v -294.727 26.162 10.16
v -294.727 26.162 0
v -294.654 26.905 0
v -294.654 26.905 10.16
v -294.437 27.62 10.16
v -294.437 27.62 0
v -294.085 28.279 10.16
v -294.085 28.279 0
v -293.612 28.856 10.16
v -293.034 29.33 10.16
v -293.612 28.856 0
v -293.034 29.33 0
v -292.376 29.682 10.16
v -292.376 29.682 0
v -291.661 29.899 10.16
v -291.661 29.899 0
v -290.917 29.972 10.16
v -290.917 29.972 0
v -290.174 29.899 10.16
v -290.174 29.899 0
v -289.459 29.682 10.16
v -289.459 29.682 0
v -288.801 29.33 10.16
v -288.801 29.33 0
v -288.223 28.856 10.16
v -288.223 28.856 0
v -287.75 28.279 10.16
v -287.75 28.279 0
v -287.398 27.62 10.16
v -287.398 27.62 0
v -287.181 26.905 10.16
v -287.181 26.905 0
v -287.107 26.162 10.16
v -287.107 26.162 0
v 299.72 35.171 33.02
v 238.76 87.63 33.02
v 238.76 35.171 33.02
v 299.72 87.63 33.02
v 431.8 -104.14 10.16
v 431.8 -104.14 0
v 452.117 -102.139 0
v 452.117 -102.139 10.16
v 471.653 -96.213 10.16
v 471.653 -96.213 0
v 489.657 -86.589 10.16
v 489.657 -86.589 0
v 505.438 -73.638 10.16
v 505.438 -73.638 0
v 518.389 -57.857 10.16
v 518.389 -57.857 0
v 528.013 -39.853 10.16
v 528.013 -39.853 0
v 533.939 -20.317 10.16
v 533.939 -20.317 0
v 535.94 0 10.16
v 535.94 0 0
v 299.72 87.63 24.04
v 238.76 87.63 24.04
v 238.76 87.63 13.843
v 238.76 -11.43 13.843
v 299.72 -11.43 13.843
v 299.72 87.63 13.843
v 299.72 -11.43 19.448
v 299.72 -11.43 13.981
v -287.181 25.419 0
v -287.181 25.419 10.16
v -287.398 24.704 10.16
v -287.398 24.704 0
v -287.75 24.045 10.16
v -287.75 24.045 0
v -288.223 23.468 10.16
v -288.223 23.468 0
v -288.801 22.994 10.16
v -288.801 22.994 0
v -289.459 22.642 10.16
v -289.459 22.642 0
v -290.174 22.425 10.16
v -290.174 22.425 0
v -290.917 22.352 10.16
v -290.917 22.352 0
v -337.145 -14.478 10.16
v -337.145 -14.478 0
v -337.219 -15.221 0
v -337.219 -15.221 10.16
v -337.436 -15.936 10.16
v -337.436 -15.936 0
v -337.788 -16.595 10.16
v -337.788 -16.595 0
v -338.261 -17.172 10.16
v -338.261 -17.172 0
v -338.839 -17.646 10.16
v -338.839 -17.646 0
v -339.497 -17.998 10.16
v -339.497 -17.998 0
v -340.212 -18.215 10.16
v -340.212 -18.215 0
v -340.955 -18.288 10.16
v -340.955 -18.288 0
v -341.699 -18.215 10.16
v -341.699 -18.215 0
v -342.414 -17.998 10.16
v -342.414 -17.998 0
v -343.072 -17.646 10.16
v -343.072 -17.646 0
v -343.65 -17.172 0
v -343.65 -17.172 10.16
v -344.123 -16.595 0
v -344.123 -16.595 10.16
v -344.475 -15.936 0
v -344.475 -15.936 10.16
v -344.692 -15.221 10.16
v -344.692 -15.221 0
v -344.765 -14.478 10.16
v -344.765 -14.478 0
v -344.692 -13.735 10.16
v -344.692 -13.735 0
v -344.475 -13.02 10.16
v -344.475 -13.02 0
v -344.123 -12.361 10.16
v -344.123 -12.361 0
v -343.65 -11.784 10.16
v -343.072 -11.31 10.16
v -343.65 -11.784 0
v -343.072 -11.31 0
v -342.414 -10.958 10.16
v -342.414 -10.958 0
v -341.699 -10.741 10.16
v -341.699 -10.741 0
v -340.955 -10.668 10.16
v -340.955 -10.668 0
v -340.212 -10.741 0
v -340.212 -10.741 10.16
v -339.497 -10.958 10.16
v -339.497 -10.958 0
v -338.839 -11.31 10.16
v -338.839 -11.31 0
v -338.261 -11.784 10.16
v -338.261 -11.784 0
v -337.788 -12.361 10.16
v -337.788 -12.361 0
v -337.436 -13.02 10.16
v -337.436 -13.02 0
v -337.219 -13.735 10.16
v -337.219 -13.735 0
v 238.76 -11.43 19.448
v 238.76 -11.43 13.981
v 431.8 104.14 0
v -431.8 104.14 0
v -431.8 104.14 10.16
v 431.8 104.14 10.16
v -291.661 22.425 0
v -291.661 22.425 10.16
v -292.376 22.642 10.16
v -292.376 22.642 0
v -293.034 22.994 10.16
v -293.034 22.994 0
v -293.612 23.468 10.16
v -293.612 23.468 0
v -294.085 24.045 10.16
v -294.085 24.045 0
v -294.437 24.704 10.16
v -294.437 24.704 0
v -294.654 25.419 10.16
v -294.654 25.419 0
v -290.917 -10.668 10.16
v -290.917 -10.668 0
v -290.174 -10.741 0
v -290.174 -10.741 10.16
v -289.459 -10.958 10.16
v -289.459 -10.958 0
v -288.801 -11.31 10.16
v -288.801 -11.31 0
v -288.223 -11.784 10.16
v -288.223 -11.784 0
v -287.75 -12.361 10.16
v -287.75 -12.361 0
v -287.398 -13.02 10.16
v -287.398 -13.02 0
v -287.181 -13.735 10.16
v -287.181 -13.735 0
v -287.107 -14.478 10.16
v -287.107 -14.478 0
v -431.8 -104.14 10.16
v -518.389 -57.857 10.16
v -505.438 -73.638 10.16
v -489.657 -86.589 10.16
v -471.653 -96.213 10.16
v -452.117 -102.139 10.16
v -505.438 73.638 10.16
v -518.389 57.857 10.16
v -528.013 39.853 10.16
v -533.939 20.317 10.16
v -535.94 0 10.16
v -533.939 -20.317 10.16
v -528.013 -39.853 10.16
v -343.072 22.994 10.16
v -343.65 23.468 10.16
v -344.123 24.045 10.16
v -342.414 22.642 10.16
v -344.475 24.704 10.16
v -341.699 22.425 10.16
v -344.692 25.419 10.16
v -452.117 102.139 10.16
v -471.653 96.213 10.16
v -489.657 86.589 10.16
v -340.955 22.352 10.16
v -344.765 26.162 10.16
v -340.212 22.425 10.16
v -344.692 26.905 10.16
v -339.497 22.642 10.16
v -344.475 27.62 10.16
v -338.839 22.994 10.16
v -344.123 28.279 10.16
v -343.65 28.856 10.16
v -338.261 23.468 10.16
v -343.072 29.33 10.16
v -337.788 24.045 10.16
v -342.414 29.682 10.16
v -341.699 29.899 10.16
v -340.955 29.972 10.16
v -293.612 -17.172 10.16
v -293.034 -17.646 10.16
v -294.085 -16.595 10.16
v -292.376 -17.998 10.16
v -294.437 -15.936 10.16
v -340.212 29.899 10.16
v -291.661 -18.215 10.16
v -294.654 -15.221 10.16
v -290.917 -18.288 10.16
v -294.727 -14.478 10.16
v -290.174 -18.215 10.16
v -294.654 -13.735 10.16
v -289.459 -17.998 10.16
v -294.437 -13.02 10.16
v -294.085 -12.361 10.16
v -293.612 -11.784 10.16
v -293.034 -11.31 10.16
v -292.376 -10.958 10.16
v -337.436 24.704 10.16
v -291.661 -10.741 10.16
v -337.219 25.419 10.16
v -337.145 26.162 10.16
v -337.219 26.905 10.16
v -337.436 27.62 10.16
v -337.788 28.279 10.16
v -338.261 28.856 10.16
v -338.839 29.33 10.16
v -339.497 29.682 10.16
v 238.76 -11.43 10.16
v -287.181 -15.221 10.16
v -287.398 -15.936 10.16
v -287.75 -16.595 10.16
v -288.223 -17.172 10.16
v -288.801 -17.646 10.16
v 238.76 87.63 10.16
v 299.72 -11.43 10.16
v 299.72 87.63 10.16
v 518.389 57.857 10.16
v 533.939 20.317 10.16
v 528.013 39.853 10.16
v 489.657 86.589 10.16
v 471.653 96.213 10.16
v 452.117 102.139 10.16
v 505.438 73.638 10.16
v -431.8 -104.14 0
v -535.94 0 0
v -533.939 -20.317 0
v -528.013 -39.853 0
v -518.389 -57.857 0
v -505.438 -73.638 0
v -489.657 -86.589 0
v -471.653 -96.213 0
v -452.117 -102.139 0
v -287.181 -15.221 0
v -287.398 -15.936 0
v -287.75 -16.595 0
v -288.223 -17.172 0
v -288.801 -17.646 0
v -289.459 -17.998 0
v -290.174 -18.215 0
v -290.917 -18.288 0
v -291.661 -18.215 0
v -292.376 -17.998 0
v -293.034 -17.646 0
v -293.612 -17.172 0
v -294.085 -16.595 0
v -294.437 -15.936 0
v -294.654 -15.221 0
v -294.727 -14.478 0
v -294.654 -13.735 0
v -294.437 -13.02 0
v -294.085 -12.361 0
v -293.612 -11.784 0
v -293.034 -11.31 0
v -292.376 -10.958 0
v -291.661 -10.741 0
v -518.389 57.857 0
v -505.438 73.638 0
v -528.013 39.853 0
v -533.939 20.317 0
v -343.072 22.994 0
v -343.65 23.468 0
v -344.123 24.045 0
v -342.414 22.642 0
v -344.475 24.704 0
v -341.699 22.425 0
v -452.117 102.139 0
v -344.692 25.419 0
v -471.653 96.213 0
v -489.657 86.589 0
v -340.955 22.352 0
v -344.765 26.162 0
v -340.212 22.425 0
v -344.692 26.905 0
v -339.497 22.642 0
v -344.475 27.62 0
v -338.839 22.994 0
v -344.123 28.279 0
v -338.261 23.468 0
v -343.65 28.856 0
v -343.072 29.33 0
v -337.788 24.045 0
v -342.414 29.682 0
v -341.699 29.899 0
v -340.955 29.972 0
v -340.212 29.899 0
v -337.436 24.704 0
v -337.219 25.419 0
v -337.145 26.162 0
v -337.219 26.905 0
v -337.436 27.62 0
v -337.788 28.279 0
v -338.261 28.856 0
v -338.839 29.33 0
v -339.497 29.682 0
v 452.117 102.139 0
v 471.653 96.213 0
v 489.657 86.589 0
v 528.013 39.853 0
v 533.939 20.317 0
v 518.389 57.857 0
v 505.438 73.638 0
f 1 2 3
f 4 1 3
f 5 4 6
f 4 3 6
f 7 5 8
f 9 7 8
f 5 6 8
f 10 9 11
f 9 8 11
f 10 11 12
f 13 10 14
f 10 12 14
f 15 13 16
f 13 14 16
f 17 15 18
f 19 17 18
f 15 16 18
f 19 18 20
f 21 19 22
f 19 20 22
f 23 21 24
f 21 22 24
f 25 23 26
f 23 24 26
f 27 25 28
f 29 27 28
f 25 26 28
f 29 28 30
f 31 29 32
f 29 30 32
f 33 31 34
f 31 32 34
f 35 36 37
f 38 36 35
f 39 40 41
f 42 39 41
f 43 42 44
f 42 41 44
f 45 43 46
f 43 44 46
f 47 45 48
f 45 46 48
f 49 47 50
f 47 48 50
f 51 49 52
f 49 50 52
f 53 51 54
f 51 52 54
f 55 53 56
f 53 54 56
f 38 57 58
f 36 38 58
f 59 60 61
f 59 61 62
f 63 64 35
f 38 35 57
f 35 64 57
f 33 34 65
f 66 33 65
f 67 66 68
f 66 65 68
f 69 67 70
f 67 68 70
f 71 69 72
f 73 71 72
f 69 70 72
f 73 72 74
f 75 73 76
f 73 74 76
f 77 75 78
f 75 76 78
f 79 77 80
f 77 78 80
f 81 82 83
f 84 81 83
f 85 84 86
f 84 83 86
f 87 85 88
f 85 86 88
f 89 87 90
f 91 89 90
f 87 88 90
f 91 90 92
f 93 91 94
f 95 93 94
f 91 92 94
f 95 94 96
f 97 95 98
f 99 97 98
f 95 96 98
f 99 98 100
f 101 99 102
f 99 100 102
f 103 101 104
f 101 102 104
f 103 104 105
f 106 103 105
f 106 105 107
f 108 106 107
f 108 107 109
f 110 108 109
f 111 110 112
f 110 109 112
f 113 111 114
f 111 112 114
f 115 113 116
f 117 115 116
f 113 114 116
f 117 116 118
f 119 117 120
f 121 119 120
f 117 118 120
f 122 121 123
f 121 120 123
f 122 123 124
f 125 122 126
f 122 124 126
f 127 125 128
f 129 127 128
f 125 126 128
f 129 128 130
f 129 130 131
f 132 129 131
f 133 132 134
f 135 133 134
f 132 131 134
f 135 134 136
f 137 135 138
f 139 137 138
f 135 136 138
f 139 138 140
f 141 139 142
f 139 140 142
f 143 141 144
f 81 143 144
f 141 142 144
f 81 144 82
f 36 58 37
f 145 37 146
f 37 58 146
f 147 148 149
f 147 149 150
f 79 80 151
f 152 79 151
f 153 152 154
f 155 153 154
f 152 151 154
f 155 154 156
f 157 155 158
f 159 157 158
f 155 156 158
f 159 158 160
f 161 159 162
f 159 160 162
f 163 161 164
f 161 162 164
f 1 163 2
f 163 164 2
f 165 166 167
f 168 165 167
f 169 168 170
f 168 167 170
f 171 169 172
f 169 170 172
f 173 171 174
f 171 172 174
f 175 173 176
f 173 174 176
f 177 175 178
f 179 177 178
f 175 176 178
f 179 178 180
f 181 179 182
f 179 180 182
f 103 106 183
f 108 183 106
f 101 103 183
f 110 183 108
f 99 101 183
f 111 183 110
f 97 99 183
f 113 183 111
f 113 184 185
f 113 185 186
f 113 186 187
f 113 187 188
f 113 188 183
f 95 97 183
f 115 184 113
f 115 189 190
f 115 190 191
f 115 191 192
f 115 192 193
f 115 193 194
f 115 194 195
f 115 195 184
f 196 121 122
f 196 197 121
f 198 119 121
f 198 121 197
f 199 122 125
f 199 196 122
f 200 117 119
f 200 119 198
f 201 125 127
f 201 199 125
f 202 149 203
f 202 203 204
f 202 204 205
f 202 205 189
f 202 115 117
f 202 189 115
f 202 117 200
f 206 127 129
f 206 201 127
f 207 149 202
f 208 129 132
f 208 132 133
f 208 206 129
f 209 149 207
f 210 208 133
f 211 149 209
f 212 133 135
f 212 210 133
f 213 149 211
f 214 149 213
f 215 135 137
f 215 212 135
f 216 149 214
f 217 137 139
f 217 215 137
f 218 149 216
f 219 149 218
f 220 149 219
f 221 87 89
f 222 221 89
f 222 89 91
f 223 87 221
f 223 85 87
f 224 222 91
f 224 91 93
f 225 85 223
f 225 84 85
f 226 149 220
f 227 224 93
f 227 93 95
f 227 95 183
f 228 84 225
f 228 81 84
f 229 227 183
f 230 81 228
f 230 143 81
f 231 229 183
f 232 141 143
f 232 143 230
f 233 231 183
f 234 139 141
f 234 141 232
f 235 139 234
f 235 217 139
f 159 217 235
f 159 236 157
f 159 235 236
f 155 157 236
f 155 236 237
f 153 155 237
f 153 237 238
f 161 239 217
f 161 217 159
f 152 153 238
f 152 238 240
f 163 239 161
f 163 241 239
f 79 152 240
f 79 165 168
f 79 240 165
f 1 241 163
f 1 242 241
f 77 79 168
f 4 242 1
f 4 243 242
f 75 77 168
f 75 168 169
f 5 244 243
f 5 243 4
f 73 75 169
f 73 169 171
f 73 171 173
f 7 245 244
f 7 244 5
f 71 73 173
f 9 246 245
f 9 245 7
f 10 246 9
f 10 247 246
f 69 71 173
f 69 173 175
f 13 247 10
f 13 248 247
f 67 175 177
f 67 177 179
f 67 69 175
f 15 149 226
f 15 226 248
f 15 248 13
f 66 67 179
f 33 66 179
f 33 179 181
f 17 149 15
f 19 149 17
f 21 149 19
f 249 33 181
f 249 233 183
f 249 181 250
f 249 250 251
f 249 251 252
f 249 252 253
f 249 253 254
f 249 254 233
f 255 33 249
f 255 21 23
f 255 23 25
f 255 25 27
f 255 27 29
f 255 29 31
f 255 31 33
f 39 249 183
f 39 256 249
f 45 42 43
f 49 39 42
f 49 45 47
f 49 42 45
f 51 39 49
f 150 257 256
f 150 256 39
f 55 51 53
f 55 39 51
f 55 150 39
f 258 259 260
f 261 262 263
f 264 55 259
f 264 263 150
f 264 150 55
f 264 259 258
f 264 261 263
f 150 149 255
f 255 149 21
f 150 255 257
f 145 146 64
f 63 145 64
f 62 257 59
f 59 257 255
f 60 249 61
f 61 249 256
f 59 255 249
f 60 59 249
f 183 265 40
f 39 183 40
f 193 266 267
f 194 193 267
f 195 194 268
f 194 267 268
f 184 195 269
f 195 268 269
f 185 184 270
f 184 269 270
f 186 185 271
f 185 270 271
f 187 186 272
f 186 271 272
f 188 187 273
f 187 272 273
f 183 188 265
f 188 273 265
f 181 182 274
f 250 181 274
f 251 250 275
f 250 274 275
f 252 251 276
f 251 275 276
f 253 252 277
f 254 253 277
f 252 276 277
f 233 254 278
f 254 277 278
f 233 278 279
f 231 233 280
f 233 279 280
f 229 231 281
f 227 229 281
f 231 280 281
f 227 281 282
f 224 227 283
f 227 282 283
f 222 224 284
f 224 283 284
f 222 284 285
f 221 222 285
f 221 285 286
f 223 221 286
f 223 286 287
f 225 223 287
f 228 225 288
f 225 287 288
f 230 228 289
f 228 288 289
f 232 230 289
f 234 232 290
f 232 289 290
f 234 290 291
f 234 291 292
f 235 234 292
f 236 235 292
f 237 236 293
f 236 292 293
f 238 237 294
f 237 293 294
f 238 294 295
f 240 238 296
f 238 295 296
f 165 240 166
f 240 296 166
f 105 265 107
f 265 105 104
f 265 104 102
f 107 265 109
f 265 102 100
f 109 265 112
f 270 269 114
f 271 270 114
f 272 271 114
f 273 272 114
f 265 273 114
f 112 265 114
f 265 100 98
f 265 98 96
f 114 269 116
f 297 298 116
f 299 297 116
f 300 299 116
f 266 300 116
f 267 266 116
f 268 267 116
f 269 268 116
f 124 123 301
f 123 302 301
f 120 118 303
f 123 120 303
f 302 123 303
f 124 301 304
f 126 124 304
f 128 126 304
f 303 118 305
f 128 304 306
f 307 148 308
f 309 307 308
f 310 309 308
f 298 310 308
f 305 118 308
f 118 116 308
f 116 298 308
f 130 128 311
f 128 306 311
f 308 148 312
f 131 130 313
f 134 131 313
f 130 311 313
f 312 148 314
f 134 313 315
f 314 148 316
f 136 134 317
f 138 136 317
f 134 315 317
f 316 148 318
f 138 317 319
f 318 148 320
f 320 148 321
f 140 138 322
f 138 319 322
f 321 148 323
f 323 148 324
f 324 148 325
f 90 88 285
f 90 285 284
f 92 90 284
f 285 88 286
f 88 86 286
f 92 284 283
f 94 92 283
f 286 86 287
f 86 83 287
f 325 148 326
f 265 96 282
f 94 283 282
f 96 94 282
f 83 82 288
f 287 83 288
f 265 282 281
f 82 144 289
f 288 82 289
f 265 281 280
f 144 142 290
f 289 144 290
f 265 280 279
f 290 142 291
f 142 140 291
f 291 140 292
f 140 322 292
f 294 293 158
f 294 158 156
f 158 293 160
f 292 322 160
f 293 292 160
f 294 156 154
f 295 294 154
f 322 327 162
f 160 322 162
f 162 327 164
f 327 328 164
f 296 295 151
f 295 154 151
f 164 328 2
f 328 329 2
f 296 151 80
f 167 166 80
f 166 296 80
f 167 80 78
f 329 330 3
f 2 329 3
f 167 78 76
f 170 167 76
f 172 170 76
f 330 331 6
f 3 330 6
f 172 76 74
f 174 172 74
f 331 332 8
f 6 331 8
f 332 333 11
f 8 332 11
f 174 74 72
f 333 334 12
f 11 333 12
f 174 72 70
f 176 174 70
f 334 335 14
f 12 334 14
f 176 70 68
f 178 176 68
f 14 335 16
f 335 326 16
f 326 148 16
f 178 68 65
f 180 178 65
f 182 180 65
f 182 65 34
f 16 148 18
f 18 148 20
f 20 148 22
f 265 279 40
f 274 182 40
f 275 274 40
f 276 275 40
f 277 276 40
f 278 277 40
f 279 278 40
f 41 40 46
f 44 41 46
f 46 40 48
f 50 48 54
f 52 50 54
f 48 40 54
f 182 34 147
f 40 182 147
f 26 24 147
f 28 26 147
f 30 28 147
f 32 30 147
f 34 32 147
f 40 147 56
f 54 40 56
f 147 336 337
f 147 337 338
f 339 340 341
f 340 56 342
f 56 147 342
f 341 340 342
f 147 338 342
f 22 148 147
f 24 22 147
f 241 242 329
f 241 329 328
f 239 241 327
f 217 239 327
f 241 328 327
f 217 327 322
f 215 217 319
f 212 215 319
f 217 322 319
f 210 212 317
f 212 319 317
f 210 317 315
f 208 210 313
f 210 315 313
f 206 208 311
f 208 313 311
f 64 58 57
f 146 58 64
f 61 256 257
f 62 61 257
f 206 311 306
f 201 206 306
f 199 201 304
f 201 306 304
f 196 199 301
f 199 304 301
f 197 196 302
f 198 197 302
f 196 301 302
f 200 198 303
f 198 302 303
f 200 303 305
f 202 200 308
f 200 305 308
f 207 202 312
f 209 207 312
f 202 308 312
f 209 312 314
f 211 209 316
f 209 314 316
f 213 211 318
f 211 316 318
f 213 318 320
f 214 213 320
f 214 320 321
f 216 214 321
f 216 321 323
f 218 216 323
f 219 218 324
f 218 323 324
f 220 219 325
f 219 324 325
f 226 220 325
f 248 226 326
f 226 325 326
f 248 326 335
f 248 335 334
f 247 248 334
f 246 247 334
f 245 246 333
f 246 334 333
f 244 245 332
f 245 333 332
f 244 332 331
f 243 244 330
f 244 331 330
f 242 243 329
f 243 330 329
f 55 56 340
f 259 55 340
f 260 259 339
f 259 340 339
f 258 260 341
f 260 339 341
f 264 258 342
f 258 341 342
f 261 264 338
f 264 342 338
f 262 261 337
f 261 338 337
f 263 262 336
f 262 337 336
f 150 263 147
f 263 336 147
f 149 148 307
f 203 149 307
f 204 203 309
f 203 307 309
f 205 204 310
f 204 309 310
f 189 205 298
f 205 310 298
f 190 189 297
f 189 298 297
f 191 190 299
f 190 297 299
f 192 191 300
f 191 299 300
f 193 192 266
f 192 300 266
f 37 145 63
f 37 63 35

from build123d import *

# Parameters (mm, degrees)
F0_W     = 863.6
F0_H     = 208.28
F1_DEPTH = 10.16
F3_DEPTH = 33.02
F5_DEPTH = 734.06
F6_DEPTH = 548.64


# Not quite as in the source:
# - a feature names something its author has since deleted; it is built from what else it names


with BuildPart() as f1:
    # F0 (on Top) → F1 (new body)
    with BuildSketch(Plane.XY):
        Rectangle(F0_W, F0_H)
        with BuildLine():
            ThreePointArc((-337.1454958344, -14.4779989496), (-343.6495726707, -17.1720757859), (-340.9554958344, -10.6679989496))
            ThreePointArc((-340.9554958344, -10.6679989496), (-338.261418998, -11.7839221133), (-337.1454958344, -14.4779989496))
        make_face(mode=Mode.SUBTRACT)
        with BuildLine():
            ThreePointArc((-287.1074958344, -14.4779989496), (-293.6115726707, -17.1720757859), (-290.9174958344, -10.6679989496))
            ThreePointArc((-290.9174958344, -10.6679989496), (-288.223418998, -11.7839221133), (-287.1074958344, -14.4779989496))
        make_face(mode=Mode.SUBTRACT)
        with BuildLine():
            ThreePointArc((-340.9554958344, 22.3520010504), (-343.6495726707, 28.8560778867), (-337.1454958344, 26.1620010504))
            ThreePointArc((-337.1454958344, 26.1620010504), (-338.261418998, 23.4679242141), (-340.9554958344, 22.3520010504))
        make_face(mode=Mode.SUBTRACT)
        with BuildLine():
            ThreePointArc((-290.9174958344, 22.3520010504), (-293.6115726707, 23.4679242141), (-294.7274958344, 26.1620010504))
            ThreePointArc((-294.7274958344, 26.1620010504), (-290.9174958344, 29.9720010504), (-287.1074958344, 26.1620010504))
            ThreePointArc((-287.1074958344, 26.1620010504), (-288.223418998, 23.4679242141), (-290.9174958344, 22.3520010504))
        make_face(mode=Mode.SUBTRACT)
        with BuildLine():
            ThreePointArc((-535.94, 0), (-505.4381001928, -73.6381001928), (-431.8, -104.14))
            Line((-431.8, -104.14), (-431.8, 104.14))
            ThreePointArc((-431.8, 104.14), (-505.4381001928, 73.6381001928), (-535.94, 0))
        make_face()
        with BuildLine():
            Line((431.8, 104.14), (431.8, -104.14))
            ThreePointArc((431.8, -104.14), (505.4381001928, -73.6381001928), (535.94, 0))
            ThreePointArc((535.94, 0), (505.4381001928, 73.6381001928), (431.8, 104.14))
        make_face()
    extrude(amount=F1_DEPTH)

    # F2 (on Top) → F3 (join)
    with BuildSketch(Plane.XY):
        Polygon((238.76, -11.43), (299.72, -11.43), (299.72, 87.63), (238.76, 87.63), (238.76, 0), align=None)
    extrude(amount=F3_DEPTH)

    # F4 (on Right) → F5 (cut)
    with BuildSketch(Plane.YZ):
        Polygon((-16.7762897909, 37.7759821713), (-15.3684904799, 18.3014087379), (51.5020377934, 37.7759821713), align=None)
        Polygon((93.5014262795, 24.6365107596), (-12.7875227481, 13.8433724642), (93.5014262795, 13.8433724642), align=None)
    extrude(amount=F5_DEPTH, mode=Mode.SUBTRACT)

    # F0 (on Top) → F6 (cut)
    with BuildSketch(Plane.XY):
        Rectangle(F0_W, F0_H)
        with BuildLine():
            ThreePointArc((-337.1454958344, -14.4779989496), (-343.6495726707, -17.1720757859), (-340.9554958344, -10.6679989496))
            ThreePointArc((-340.9554958344, -10.6679989496), (-338.261418998, -11.7839221133), (-337.1454958344, -14.4779989496))
        make_face(mode=Mode.SUBTRACT)
        with BuildLine():
            ThreePointArc((-287.1074958344, -14.4779989496), (-293.6115726707, -17.1720757859), (-290.9174958344, -10.6679989496))
            ThreePointArc((-290.9174958344, -10.6679989496), (-288.223418998, -11.7839221133), (-287.1074958344, -14.4779989496))
        make_face(mode=Mode.SUBTRACT)
        with BuildLine():
            ThreePointArc((-340.9554958344, 22.3520010504), (-343.6495726707, 28.8560778867), (-337.1454958344, 26.1620010504))
            ThreePointArc((-337.1454958344, 26.1620010504), (-338.261418998, 23.4679242141), (-340.9554958344, 22.3520010504))
        make_face(mode=Mode.SUBTRACT)
        with BuildLine():
            ThreePointArc((-290.9174958344, 22.3520010504), (-293.6115726707, 23.4679242141), (-294.7274958344, 26.1620010504))
            ThreePointArc((-294.7274958344, 26.1620010504), (-290.9174958344, 29.9720010504), (-287.1074958344, 26.1620010504))
            ThreePointArc((-287.1074958344, 26.1620010504), (-288.223418998, 23.4679242141), (-290.9174958344, 22.3520010504))
        make_face(mode=Mode.SUBTRACT)
        with BuildLine():
            ThreePointArc((-535.94, 0), (-505.4381001928, -73.6381001928), (-431.8, -104.14))
            Line((-431.8, -104.14), (-431.8, 104.14))
            ThreePointArc((-431.8, 104.14), (-505.4381001928, 73.6381001928), (-535.94, 0))
        make_face()
        with BuildLine():
            Line((431.8, 104.14), (431.8, -104.14))
            ThreePointArc((431.8, -104.14), (505.4381001928, -73.6381001928), (535.94, 0))
            ThreePointArc((535.94, 0), (505.4381001928, 73.6381001928), (431.8, 104.14))
        make_face()
    extrude(amount=-F6_DEPTH, mode=Mode.SUBTRACT)


solid = f1.part
